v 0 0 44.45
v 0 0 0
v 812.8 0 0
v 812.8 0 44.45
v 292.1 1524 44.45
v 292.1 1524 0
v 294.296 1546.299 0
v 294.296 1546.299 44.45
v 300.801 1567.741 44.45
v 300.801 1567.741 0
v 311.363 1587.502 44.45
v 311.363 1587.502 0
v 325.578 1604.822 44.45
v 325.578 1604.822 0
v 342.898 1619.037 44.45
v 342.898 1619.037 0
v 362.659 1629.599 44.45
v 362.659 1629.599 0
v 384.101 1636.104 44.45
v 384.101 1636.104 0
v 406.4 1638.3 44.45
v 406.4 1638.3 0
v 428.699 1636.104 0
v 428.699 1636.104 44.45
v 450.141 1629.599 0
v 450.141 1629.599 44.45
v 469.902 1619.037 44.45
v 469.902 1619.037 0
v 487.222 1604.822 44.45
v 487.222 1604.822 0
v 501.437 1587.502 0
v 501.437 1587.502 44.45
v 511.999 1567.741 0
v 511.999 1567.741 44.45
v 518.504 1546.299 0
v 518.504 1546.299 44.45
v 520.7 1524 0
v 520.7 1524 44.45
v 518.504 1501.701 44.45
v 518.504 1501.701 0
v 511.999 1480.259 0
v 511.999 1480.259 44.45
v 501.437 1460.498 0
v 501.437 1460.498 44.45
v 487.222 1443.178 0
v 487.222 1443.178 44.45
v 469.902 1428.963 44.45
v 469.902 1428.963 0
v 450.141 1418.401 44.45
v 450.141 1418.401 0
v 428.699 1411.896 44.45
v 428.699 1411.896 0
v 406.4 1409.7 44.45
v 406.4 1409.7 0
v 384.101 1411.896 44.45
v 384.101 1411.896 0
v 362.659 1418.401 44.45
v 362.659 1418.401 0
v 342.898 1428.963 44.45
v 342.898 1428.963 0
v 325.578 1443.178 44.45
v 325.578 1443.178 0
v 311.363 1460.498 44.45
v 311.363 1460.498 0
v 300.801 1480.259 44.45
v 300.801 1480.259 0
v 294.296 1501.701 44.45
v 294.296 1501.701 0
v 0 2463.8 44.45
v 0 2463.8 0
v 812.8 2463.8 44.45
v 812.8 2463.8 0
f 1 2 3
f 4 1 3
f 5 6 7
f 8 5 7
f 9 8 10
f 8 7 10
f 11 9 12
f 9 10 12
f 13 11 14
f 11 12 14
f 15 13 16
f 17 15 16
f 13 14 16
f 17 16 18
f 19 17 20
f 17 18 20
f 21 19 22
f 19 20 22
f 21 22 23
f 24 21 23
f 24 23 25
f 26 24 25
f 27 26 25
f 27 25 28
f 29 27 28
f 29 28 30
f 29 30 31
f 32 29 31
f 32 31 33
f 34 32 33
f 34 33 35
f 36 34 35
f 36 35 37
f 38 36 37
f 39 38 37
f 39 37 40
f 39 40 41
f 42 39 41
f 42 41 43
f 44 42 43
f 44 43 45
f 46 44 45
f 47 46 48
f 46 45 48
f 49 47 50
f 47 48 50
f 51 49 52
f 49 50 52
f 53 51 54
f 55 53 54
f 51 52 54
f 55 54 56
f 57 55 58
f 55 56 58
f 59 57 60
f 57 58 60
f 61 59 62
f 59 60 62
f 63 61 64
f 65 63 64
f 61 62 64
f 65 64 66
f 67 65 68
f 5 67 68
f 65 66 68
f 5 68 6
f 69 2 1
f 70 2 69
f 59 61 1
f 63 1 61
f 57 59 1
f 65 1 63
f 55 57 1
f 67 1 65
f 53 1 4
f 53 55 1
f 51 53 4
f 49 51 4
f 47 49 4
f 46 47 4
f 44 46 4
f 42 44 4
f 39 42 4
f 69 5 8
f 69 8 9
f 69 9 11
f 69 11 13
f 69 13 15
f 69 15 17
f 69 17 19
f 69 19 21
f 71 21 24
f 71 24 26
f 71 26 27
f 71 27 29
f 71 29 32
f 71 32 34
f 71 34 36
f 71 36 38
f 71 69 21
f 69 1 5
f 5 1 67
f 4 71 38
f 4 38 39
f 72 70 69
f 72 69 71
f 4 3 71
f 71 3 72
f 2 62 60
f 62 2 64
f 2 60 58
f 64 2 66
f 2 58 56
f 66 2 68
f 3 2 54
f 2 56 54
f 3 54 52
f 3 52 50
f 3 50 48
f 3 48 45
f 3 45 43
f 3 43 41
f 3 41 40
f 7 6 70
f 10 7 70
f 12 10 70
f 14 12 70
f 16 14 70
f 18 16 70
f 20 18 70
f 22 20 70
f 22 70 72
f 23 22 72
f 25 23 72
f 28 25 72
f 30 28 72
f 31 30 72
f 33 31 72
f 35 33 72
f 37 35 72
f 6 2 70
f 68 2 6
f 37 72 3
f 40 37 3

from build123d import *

# Parameters (mm, degrees)
F0_W     = 812.8
F0_H     = 2463.8
F1_DEPTH = 44.45
F3_D     = 228.6
F4_W     = 812.8
F4_H     = 50.8
F5_DEPTH = 3.429


# Not quite as in the source:
# - a feature names something its author has since deleted; it is built from what else it names


with BuildPart() as f1:
    # F0 (on Top) → F1 (new body)
    with BuildSketch(Plane.XY):
        with Locations((406.4, 1231.9)):
            Rectangle(F0_W, F0_H)
    extrude(amount=F1_DEPTH)

    # F3 (through all)
    with Locations(Plane.XY.offset(44.45)):
        with Locations((406.4, 1524)):
            Hole(F3_D / 2)

    # F4 (on face) → F5 (join)
    with BuildSketch(Plane.XY.offset(44.45)):
        with Locations((406.4, 2133.6)):
            Rectangle(F4_W, F4_H)
        with Locations((406.4, 2032)):
            Rectangle(F4_W, F4_H)
        with Locations((406.4, 1930.4)):
            Rectangle(F4_W, F4_H)
        with Locations((406.4, 1828.8)):
            Rectangle(F4_W, F4_H)
        with Locations((406.4, 1727.2)):
            Rectangle(F4_W, F4_H)
        with BuildLine():
            Line((0, 1549.4), (0, 1498.6))
            Line((0, 1498.6), (256.1315735093, 1498.6))
            ThreePointArc((256.1315735093, 1498.6), (254, 1524), (256.1315735093, 1549.4))
            Line((256.1315735093, 1549.4), (0, 1549.4))
        make_face()
        with BuildLine():
            Line((556.6684264907, 1498.6), (812.8, 1498.6))
            Line((812.8, 1498.6), (812.8, 1549.4))
            Line((812.8, 1549.4), (556.6684264907, 1549.4))
            ThreePointArc((556.6684264907, 1549.4), (558.2661716729, 1536.7446420666), (558.8, 1524))
            ThreePointArc((558.8, 1524), (558.2661716729, 1511.2553579334), (556.6684264907, 1498.6))
        make_face()
        with BuildLine():
            Line((490.642269675, 1397), (812.8, 1397))
            Line((812.8, 1397), (812.8, 1447.8))
            Line((812.8, 1447.8), (538.3822715367, 1447.8))
            ThreePointArc((538.3822715367, 1447.8), (517.455945611, 1419.6336407436), (490.642269675, 1397))
        make_face()
        with Locations((406.4, 1320.8)):
            Rectangle(F4_W, F4_H)
        Polygon((0, 1231.9), (0, 1193.8), (812.8, 1193.8), (812.8, 1231.9), (812.8, 1244.6), (0, 1244.6), align=None)
        with Locations((406.4, 1117.6)):
            Rectangle(F4_W, F4_H)
        with Locations((406.4, 1016)):
            Rectangle(F4_W, F4_H)
        with Locations((406.4, 914.4)):
            Rectangle(F4_W, F4_H)
        with Locations((406.4, 812.8)):
            Rectangle(F4_W, F4_H)
        with Locations((406.4, 711.2)):
            Rectangle(F4_W, F4_H)
        with Locations((406.4, 609.6)):
            Rectangle(F4_W, F4_H)
        with Locations((406.4, 508)):
            Rectangle(F4_W, F4_H)
        with Locations((406.4, 406.4)):
            Rectangle(F4_W, F4_H)
        with Locations((406.4, 304.8)):
            Rectangle(F4_W, F4_H)
        with Locations((406.4, 203.2)):
            Rectangle(F4_W, F4_H)
        with BuildLine():
            Line((538.3822715367, 1600.2), (812.8, 1600.2))
            Line((812.8, 1600.2), (812.8, 1651))
            Line((812.8, 1651), (490.642269675, 1651))
            ThreePointArc((490.642269675, 1651), (517.455945611, 1628.3663592564), (538.3822715367, 1600.2))
        make_face()
        with BuildLine():
            Line((0, 1447.8), (0, 1397))
            Line((0, 1397), (322.157730325, 1397))
            ThreePointArc((322.157730325, 1397), (295.344054389, 1419.6336407436), (274.4177284633, 1447.8))
            Line((274.4177284633, 1447.8), (0, 1447.8))
        make_face()
        with BuildLine():
            Line((0, 1651), (0, 1600.2))
            Line((0, 1600.2), (274.4177284633, 1600.2))
            ThreePointArc((274.4177284633, 1600.2), (295.344054389, 1628.3663592564), (322.157730325, 1651))
            Line((322.157730325, 1651), (0, 1651))
        make_face()
    extrude(amount=-F5_DEPTH)


solid = f1.part
